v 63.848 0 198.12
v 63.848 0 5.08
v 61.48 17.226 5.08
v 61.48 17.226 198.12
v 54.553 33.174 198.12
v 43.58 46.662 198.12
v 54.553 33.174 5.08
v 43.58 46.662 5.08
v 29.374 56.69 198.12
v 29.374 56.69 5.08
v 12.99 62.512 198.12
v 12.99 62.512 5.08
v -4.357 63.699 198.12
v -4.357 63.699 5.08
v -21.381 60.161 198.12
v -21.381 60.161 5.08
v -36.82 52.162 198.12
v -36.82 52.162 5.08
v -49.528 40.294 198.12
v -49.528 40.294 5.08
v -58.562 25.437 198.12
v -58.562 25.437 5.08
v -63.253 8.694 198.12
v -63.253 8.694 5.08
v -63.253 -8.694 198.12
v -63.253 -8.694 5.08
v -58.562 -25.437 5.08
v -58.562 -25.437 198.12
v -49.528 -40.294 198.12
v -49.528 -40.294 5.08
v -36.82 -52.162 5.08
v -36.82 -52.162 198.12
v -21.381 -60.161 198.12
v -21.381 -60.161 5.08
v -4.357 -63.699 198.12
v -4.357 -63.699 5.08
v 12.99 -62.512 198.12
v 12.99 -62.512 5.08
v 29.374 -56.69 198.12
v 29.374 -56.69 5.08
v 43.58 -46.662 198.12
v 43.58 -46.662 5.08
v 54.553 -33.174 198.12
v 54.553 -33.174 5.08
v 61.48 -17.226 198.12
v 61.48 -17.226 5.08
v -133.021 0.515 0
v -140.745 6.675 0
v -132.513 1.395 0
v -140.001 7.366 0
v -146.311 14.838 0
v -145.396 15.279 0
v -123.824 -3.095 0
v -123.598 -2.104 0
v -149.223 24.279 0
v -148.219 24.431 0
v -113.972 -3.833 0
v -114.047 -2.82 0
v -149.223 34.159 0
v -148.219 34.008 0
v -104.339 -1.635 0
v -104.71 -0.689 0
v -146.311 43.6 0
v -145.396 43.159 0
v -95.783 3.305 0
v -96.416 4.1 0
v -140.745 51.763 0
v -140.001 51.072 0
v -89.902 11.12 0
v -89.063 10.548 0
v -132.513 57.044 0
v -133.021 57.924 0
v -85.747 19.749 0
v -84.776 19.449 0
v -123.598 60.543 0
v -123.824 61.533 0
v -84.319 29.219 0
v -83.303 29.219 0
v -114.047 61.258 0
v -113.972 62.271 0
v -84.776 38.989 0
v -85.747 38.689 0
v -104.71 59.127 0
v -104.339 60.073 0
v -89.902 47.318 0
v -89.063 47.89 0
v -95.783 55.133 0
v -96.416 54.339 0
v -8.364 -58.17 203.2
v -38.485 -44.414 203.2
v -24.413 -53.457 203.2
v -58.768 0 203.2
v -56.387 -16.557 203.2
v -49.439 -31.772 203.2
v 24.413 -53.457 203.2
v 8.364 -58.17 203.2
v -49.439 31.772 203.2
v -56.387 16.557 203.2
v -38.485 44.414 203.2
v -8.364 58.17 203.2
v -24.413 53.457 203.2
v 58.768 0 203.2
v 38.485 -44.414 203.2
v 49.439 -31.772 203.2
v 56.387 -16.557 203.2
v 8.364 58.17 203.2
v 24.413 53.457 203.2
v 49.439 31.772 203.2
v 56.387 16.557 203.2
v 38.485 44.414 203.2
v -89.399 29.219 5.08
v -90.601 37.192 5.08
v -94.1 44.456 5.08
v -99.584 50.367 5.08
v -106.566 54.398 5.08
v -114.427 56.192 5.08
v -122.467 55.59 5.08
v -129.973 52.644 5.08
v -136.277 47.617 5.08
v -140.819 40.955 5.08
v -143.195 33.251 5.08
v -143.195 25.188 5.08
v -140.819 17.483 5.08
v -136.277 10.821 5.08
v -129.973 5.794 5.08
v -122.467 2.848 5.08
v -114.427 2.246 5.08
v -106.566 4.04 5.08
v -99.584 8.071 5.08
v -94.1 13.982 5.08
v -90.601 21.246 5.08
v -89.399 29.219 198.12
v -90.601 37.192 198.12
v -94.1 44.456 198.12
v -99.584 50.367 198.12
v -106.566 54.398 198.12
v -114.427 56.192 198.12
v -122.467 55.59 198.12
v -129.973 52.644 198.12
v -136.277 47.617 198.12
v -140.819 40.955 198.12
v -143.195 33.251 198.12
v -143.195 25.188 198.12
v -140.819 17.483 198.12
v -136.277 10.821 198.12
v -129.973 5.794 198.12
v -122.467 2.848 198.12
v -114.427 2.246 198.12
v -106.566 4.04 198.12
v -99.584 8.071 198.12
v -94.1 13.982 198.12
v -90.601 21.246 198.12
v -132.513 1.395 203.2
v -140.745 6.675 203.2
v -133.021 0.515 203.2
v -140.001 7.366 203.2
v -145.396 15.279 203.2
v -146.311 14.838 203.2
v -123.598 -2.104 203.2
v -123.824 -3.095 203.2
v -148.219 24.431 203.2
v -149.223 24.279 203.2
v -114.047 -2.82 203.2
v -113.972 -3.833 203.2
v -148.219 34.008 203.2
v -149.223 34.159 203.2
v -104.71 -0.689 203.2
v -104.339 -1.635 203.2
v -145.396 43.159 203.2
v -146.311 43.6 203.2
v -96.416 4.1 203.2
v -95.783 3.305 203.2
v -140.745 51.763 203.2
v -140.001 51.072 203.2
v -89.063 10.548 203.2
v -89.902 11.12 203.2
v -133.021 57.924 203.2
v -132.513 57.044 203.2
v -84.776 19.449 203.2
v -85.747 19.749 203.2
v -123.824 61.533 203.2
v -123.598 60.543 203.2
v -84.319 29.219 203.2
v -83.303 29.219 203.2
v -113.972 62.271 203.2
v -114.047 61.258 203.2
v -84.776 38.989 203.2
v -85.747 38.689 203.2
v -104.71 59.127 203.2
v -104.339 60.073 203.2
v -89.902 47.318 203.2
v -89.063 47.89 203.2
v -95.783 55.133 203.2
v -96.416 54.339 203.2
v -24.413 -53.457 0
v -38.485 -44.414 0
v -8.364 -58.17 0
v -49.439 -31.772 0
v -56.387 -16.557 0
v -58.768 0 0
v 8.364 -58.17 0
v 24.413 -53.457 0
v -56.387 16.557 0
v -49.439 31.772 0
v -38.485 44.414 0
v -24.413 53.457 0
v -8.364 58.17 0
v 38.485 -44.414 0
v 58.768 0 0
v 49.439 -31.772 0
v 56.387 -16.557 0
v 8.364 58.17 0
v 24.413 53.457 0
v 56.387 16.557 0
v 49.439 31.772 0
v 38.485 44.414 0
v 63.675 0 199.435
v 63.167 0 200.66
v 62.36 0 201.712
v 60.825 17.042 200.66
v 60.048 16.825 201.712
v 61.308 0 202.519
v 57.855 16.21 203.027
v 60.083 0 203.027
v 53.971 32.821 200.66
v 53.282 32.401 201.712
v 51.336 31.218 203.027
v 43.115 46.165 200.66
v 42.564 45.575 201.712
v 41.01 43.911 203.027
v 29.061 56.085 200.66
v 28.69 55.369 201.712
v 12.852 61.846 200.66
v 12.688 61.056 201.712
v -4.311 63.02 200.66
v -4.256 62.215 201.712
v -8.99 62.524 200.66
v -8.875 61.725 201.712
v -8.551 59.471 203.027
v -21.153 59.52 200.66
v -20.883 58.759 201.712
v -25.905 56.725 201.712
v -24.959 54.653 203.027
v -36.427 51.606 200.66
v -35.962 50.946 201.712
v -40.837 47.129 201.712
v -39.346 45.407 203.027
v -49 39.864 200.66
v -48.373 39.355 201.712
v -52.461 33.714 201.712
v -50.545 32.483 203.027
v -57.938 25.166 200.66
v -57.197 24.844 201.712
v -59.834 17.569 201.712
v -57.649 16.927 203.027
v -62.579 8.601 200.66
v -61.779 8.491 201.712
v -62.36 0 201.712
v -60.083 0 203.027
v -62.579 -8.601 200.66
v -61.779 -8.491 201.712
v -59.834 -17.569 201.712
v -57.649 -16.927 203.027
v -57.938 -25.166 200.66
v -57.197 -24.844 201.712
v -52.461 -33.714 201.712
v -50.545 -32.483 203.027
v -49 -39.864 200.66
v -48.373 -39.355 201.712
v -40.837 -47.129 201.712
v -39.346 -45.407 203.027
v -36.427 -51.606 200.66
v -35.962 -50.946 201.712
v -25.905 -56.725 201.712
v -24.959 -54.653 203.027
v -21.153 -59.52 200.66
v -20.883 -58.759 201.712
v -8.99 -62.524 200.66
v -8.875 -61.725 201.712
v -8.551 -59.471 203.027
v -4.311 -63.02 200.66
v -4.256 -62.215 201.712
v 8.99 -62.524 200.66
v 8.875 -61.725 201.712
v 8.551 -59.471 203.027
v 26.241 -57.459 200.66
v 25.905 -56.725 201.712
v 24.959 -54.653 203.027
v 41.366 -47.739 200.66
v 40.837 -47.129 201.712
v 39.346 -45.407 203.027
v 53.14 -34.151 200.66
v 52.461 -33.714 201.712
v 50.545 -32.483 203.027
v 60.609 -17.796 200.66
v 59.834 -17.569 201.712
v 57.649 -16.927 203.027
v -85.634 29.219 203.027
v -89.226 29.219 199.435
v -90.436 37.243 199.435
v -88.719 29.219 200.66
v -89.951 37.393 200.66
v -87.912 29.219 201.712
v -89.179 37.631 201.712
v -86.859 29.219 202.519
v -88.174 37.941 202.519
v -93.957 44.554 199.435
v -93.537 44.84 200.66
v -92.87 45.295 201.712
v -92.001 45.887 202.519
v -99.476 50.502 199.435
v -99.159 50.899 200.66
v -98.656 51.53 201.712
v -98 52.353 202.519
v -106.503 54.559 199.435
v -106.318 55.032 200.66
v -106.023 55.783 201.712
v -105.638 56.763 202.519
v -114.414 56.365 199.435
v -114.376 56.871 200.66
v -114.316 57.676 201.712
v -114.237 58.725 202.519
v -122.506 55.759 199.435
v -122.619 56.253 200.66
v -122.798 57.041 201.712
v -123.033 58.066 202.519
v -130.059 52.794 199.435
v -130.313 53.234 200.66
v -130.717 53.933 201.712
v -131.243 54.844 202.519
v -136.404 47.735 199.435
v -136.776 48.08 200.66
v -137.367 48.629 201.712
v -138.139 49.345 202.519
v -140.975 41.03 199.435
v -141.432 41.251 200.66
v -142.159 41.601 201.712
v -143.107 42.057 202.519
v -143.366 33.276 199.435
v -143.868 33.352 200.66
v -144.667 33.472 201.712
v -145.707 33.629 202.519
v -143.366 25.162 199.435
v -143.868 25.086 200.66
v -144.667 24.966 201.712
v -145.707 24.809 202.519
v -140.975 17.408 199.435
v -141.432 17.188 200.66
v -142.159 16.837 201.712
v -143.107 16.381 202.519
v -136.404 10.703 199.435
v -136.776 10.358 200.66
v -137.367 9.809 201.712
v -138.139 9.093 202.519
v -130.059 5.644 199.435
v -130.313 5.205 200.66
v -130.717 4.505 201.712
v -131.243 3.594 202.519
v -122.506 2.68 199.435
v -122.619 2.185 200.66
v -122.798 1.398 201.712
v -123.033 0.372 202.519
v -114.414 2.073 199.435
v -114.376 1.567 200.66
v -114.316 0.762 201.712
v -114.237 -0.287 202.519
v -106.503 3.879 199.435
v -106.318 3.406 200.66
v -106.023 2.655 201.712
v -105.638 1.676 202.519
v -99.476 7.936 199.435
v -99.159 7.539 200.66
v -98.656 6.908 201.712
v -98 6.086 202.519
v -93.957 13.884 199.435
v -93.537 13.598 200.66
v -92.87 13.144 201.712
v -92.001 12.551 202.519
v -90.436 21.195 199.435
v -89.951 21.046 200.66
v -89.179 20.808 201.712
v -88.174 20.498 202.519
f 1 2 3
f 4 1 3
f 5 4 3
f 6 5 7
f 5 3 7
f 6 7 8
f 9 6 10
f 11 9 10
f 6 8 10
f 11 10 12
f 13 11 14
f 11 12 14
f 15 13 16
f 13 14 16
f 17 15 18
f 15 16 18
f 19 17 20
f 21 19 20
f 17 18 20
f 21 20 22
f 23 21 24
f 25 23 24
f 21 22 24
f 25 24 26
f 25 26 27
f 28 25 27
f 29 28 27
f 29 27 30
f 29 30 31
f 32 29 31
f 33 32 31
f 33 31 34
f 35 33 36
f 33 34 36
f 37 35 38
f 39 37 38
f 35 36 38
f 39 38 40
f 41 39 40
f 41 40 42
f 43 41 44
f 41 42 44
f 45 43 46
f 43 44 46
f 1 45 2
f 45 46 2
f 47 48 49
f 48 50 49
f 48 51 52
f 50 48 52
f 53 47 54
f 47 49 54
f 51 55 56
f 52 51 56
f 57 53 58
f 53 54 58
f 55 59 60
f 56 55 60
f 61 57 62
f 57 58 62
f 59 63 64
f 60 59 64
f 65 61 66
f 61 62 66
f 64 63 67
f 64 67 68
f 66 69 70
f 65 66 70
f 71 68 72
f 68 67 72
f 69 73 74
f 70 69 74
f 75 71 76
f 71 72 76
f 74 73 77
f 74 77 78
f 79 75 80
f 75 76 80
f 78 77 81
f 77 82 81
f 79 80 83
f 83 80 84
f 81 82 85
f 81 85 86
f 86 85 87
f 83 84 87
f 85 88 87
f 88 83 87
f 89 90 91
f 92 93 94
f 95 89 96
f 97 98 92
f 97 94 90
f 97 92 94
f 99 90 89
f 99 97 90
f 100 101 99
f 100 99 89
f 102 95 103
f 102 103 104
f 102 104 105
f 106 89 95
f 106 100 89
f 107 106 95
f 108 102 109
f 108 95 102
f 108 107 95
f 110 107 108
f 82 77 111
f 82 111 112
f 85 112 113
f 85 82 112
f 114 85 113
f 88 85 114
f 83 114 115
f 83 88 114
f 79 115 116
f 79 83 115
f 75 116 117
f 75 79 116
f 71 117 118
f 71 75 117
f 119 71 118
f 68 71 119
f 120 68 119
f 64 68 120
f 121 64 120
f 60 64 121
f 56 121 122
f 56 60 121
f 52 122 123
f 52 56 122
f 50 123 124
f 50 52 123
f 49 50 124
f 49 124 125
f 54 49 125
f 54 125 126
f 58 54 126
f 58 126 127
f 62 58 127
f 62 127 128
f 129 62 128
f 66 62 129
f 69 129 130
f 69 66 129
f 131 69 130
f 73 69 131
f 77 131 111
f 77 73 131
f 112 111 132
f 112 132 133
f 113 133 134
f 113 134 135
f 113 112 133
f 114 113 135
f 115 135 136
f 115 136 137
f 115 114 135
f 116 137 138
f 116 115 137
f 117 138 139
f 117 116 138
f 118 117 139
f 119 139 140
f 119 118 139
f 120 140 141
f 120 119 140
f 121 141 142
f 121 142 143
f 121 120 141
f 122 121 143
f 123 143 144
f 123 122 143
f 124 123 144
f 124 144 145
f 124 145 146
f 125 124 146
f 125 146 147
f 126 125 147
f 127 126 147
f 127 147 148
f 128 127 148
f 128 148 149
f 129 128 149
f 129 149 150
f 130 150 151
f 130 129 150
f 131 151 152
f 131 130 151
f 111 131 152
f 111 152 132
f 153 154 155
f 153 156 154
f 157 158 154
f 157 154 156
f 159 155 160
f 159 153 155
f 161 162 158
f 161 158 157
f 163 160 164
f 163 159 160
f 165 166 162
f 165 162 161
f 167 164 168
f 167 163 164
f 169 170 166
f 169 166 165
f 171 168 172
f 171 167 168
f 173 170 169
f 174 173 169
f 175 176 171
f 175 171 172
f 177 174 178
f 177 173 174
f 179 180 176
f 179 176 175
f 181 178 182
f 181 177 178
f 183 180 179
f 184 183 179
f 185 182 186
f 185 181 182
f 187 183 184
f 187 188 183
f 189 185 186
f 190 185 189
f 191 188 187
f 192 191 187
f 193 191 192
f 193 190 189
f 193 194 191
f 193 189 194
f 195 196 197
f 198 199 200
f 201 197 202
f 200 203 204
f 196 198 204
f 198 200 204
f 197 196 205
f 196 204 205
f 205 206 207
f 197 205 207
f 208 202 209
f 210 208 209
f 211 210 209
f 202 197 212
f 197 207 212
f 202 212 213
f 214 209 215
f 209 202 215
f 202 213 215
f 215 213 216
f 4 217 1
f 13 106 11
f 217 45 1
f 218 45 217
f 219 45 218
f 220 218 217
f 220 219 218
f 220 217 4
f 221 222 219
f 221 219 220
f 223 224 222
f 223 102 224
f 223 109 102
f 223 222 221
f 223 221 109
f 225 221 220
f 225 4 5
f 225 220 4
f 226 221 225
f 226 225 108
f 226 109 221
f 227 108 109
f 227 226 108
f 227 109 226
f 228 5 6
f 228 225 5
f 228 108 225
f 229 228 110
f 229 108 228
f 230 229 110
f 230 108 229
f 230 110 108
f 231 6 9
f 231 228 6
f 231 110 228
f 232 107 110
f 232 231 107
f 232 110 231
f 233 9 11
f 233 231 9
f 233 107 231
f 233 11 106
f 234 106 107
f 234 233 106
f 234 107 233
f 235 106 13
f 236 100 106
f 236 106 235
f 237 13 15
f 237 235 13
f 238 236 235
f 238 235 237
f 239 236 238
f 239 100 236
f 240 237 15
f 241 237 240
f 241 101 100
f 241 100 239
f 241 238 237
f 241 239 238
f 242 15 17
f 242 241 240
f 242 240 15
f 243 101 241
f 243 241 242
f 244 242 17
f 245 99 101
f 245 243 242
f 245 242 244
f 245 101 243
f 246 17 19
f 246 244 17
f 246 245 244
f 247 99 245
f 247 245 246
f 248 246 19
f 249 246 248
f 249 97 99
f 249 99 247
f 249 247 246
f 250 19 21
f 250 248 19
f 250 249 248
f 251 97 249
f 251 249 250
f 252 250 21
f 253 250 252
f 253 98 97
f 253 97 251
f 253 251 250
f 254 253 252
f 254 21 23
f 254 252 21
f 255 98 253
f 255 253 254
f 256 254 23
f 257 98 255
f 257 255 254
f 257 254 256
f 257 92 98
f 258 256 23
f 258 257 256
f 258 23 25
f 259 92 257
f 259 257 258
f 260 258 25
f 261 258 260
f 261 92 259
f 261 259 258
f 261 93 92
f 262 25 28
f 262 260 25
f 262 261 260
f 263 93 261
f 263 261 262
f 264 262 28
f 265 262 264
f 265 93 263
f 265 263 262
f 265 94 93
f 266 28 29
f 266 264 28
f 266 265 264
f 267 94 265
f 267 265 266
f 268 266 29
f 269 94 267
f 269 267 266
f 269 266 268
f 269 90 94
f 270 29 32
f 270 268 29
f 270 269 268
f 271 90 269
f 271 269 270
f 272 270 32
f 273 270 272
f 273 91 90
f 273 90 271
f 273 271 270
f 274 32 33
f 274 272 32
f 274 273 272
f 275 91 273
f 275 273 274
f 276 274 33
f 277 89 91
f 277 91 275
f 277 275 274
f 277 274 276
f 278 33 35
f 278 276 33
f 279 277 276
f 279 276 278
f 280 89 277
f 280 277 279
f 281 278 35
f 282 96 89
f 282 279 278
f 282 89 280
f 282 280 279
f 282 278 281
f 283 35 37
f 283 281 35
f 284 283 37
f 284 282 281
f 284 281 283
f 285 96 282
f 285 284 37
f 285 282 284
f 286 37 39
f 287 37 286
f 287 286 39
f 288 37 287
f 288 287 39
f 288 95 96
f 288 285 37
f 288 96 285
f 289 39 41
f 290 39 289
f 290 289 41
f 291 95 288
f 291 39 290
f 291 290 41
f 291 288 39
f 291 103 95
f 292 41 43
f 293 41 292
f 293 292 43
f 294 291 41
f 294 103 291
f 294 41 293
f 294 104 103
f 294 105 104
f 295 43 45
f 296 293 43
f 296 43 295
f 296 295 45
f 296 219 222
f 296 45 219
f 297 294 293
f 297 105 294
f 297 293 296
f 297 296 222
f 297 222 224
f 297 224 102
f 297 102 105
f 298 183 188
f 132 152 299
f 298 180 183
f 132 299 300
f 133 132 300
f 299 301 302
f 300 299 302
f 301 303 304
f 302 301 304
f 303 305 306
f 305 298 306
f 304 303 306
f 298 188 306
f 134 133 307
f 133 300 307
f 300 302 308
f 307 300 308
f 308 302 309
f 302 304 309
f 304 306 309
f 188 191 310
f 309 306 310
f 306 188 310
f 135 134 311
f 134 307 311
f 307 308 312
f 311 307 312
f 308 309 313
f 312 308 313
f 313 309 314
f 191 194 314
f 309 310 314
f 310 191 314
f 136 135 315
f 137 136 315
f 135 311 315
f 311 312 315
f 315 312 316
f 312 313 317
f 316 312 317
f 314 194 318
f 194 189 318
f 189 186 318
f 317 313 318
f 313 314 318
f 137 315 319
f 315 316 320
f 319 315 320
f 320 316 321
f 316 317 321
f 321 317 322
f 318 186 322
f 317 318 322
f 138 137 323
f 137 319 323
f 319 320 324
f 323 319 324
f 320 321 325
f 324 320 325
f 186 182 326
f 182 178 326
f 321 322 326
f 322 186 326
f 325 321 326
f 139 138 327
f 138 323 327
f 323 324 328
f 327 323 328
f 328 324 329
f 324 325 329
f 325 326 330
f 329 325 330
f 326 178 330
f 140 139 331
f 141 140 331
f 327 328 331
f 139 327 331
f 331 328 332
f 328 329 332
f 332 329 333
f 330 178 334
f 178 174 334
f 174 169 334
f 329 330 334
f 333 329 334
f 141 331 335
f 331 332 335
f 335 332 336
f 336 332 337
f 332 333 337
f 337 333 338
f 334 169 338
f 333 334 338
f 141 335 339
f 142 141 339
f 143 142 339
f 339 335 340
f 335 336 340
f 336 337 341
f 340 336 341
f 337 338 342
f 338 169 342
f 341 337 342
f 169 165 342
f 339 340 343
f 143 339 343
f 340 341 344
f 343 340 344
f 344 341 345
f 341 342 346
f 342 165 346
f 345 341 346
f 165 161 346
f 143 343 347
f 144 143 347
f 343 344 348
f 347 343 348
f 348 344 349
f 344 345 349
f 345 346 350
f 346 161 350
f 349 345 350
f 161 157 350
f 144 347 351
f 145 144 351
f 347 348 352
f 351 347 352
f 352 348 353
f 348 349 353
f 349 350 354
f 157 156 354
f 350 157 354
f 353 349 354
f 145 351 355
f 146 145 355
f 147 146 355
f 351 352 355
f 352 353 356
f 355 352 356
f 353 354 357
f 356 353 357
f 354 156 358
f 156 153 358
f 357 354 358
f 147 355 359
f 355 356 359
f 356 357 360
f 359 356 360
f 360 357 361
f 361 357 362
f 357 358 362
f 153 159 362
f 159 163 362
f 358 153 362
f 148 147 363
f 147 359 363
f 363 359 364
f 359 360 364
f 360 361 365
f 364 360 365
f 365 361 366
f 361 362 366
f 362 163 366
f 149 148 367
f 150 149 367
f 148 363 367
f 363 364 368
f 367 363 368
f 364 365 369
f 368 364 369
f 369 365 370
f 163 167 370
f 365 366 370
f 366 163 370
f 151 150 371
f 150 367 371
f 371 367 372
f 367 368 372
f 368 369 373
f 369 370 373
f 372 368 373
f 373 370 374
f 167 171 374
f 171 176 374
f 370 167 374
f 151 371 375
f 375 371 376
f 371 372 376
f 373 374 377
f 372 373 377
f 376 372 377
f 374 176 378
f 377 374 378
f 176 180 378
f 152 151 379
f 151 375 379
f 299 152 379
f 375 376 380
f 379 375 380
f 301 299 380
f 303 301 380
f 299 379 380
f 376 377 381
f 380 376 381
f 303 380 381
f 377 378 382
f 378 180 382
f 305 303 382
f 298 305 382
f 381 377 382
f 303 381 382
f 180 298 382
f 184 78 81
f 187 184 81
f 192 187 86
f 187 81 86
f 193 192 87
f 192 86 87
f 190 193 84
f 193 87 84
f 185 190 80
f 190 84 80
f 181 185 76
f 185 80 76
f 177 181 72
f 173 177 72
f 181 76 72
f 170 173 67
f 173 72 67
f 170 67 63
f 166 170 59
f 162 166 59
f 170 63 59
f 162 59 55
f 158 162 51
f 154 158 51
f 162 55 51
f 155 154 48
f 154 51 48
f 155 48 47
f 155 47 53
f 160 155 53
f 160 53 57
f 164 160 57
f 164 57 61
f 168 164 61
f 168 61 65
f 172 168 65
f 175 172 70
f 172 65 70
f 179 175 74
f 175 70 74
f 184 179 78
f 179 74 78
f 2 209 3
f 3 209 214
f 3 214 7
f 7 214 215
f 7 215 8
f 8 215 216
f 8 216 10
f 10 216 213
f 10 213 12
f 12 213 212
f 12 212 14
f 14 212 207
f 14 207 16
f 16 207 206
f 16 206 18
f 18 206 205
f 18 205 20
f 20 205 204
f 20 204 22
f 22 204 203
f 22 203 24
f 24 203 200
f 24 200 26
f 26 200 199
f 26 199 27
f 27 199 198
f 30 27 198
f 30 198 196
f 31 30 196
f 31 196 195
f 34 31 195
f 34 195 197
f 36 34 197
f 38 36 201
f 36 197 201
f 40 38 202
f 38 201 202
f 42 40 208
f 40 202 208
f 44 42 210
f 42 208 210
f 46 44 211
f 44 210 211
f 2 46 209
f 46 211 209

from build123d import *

# Parameters (mm, degrees)
F0_R      = 33.1450146476
F0_R_2    = 27.048974118
F1_DEPTH  = 203.2
F0_R_3    = 63.8478883476
F3_R      = 5.08
F3_2_R    = 5.08
F4_SIZE   = 5.08
F4_2_SIZE = 5.08


# Not quite as in the source:
# - a feature of the source that left no trace in its solid (it failed there, or was rolled back) is left out


with BuildPart() as f1:
    # F0 (on Top) → F1 (new body)
    with BuildSketch(Plane.XY):
        with Locations((-116.4484322071, 29.2191132903)):
            Circle(F0_R)
        with Locations((-116.4484322071, 29.2191132903)):
            Circle(F0_R_2, mode=Mode.SUBTRACT)
    extrude(amount=F1_DEPTH)

    # F3
    f3_edges = [f1.edges().sort_by_distance(p)[0] for p in [
        (-143.497406, 29.219113, 203.2),
    ]]
    fillet(f3_edges, radius=F3_R)

    # F4
    f4_edges = [f1.edges().sort_by_distance(p)[0] for p in [
        (-89.399458, 29.219113, 99.06),
        (-143.497406, 29.219113, 198.12),
        (-143.497406, 29.219113, 0),
    ]]
    chamfer(f4_edges, length=F4_SIZE)


with BuildPart() as f1b:
    # F0 (on Top) → F1, piece 2 (new body)
    with BuildSketch(Plane.XY):
        Circle(F0_R_3)
    extrude(amount=F1_DEPTH)

    # F3#2
    f3_2_edges = [f1b.edges().sort_by_distance(p)[0] for p in [
        (-63.847888, 0, 203.2),
    ]]
    fillet(f3_2_edges, radius=F3_2_R)

    # F4#2
    f4_2_edges = [f1b.edges().sort_by_distance(p)[0] for p in [
        (63.847888, 0, 99.06),
        (-63.847888, 0, 198.12),
        (-63.847888, 0, 0),
    ]]
    chamfer(f4_2_edges, length=F4_2_SIZE)


solid = Compound([f1.part, f1b.part])
